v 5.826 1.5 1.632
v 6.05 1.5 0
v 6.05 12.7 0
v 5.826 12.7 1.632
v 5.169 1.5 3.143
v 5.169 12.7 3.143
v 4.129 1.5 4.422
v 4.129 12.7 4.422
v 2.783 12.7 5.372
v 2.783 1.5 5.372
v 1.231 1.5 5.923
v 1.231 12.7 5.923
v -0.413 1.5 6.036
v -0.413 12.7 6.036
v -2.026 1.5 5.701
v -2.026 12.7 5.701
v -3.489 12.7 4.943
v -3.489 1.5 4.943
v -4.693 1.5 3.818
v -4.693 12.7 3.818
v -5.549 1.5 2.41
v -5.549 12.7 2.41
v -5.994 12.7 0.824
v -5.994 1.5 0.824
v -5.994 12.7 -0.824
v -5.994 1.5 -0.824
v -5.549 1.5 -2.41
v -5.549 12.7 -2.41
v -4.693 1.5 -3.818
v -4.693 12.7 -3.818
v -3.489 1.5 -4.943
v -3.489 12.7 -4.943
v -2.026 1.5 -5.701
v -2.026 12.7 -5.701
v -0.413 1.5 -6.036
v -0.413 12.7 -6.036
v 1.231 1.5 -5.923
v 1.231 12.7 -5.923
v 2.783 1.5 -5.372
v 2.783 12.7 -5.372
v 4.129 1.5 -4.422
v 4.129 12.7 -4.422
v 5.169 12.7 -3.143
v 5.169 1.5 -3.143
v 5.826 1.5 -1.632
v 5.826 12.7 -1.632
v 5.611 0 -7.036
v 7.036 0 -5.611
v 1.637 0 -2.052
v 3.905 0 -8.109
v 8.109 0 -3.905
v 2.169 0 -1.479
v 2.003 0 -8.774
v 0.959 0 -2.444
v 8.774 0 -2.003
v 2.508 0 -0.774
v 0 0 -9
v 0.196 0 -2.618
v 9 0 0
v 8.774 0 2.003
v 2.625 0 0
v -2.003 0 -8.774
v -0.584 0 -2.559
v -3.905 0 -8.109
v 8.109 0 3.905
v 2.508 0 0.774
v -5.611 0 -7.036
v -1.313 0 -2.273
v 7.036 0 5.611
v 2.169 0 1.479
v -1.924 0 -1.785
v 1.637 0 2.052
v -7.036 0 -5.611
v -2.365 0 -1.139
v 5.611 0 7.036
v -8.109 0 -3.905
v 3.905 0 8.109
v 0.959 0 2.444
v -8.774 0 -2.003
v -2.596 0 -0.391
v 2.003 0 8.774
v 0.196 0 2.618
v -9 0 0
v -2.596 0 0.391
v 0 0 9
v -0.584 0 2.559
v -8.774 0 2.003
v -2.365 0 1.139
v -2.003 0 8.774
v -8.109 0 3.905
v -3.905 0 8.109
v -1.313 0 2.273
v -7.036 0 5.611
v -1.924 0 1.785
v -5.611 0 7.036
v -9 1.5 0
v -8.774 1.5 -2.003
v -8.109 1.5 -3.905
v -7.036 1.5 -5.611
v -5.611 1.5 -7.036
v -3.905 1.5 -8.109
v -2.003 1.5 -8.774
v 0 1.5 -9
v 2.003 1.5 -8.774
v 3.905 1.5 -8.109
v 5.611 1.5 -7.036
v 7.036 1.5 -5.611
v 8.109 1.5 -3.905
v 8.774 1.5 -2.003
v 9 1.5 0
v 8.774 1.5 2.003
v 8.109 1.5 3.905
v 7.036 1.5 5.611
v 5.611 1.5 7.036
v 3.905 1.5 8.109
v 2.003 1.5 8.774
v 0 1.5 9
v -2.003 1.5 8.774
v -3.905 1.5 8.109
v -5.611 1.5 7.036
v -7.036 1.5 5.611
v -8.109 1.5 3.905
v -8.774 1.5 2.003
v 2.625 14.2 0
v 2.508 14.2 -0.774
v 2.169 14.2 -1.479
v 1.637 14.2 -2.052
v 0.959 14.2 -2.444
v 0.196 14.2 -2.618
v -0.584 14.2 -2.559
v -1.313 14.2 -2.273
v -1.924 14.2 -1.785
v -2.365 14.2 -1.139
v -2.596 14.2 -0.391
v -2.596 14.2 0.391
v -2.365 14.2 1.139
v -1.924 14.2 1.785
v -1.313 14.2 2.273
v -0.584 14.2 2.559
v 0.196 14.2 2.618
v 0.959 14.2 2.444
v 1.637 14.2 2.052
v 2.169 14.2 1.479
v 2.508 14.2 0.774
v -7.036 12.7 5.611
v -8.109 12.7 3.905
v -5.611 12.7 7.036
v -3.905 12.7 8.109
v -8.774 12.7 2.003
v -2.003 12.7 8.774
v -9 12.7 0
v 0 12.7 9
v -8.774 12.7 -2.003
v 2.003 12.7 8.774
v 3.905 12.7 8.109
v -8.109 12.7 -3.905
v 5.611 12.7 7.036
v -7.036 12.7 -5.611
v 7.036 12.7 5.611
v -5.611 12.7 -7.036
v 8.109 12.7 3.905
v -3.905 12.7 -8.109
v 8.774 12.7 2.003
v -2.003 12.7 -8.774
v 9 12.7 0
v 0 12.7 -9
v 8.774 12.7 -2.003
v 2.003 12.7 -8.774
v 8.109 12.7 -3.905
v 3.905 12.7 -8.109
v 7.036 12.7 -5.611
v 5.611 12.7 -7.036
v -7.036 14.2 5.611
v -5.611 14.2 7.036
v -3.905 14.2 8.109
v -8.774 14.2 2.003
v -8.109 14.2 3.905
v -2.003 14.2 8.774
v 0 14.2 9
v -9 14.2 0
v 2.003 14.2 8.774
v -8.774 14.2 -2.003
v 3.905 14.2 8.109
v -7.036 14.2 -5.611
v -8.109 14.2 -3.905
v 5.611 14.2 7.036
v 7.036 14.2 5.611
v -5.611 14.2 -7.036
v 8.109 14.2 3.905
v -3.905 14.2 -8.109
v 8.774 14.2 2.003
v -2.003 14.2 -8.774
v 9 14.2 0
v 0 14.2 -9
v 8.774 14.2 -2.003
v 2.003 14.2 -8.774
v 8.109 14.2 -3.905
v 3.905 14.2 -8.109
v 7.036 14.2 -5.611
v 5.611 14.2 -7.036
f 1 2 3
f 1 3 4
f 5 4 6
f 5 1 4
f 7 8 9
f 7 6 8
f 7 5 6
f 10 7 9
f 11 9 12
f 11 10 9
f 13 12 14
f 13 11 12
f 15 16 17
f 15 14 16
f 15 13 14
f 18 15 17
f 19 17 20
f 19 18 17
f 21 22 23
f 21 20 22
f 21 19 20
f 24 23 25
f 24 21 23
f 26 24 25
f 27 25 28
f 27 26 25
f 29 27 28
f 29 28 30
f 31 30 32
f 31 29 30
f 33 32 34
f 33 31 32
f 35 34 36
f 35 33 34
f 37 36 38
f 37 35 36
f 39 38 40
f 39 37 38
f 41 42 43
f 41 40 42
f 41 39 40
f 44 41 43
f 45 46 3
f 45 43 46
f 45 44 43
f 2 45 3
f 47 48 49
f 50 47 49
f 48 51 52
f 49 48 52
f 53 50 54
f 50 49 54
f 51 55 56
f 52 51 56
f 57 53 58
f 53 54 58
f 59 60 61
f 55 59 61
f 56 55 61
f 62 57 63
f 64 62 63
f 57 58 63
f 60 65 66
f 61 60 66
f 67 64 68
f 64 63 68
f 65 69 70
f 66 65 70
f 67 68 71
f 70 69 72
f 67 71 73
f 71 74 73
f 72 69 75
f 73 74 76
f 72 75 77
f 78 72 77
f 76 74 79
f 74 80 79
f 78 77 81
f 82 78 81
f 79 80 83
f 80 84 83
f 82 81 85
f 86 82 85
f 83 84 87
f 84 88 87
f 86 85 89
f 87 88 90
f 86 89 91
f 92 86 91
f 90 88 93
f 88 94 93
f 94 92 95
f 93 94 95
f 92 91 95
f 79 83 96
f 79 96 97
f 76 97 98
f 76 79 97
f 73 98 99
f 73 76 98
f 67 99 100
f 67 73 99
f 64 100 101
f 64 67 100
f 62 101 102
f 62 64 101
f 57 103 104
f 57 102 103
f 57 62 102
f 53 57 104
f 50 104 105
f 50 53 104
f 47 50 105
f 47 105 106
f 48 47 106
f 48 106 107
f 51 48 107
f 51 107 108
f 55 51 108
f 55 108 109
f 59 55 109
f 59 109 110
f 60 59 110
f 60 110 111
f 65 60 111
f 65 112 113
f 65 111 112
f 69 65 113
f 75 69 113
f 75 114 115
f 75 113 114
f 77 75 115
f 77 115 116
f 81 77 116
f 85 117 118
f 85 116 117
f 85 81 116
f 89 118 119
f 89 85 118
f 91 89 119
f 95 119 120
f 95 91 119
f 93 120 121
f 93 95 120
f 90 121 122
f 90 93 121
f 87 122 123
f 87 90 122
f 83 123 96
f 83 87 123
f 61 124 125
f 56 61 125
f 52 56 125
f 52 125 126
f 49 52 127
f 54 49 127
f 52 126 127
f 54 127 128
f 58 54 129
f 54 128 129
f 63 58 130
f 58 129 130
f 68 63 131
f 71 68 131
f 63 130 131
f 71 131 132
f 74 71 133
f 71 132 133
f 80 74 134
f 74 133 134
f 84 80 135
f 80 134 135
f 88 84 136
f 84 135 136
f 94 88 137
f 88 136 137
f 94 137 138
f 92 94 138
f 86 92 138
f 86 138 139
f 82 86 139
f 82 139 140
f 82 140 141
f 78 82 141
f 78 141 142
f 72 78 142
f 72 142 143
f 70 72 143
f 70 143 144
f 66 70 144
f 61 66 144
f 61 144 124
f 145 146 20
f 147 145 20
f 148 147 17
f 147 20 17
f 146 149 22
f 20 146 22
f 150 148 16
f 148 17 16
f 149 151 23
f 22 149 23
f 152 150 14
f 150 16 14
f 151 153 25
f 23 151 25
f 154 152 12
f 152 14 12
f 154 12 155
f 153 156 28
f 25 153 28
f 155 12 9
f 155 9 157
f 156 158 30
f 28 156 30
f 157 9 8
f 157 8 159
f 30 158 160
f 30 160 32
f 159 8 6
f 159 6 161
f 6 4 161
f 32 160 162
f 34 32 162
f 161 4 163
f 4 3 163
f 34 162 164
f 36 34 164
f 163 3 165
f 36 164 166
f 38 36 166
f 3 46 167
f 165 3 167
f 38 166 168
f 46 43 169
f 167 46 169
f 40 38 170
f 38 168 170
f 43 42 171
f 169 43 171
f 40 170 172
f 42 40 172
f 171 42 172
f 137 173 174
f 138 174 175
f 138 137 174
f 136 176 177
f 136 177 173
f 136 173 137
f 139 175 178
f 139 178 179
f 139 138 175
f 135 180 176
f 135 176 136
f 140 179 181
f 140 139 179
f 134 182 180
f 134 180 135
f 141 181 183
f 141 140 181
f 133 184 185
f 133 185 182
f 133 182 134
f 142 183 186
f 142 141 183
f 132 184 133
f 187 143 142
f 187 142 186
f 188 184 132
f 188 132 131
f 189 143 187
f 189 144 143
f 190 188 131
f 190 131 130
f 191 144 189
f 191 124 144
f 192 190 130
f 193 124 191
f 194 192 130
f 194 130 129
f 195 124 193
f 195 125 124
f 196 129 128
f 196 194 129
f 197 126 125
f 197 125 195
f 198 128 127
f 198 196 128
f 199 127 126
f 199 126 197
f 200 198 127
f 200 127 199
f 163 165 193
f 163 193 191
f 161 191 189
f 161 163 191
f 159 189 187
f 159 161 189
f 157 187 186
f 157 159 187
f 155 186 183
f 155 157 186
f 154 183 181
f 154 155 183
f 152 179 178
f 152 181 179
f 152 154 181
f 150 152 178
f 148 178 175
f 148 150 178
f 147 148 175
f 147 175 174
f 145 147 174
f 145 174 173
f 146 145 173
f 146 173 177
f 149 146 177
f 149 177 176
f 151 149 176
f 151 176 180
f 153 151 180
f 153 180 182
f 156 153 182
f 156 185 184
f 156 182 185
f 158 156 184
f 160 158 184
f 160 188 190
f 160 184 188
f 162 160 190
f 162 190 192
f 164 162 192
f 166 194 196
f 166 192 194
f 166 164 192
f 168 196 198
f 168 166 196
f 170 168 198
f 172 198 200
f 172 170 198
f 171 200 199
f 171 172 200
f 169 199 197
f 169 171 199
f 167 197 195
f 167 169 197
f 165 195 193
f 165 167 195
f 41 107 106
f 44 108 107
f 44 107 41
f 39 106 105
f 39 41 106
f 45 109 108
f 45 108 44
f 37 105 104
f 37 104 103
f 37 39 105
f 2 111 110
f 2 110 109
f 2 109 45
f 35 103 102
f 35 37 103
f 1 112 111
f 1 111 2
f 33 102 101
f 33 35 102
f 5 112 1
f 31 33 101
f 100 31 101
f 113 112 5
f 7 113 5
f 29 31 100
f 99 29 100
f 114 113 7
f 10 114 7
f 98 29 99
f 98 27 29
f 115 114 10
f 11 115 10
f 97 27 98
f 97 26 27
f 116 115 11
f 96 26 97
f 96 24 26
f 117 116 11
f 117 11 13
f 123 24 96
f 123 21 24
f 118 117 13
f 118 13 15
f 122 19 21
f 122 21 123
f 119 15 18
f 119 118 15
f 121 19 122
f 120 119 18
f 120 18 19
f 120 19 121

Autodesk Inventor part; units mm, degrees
ref_plane "YZ Plane" through (0, 0, 0) normal (1, 0, 0) x (0, 1, 0)
ref_plane "XZ Plane" through (0, 0, 0) normal (0, 1, 0) x (-1, 0, 0)
ref_plane "XY Plane" through (0, 0, 0) normal (0, 0, 1) x (1, 0, 0)
sketch "Sketch1" plane through (0, 0, 0) normal (0, 1, 0) x (-1, 0, 0)
  circle A0 centre (0, 0) radius 9
  dimension "d0" = 18
extrude "Extrusion1" add sketch "Sketch1" along normal blind 1.5
sketch "Sketch2" plane through (0, 1.5, 0) normal (0, 1, 0) x (1, 0, 0)
  circle A0 centre (0, 0) radius 6.05
  dimension "d3" = 12.1
extrude "Extrusion2" add sketch "Sketch2" along normal blind 11.2
sketch "Sketch3" plane through (0, 12.7, 0) normal (0, 1, 0) x (1, 0, 0)
  circle A0 centre (0, 0) radius 9
  dimension "d6" = 18
extrude "Extrusion3" add sketch "Sketch3" along normal blind 1.5
sketch "Sketch4" plane through (0, 14.2, 0) normal (0, 1, 0) x (1, 0, 0)
  circle A0 centre (0, 0) radius 6.05 projected
  circle A1 centre (0, 0) radius 2.625
  dimension "d9" = 5.25
extrude "Extrusion4" cut sketch "Sketch4" against normal through all contours A1
properties part number "10mm_Idle_Pulley"
